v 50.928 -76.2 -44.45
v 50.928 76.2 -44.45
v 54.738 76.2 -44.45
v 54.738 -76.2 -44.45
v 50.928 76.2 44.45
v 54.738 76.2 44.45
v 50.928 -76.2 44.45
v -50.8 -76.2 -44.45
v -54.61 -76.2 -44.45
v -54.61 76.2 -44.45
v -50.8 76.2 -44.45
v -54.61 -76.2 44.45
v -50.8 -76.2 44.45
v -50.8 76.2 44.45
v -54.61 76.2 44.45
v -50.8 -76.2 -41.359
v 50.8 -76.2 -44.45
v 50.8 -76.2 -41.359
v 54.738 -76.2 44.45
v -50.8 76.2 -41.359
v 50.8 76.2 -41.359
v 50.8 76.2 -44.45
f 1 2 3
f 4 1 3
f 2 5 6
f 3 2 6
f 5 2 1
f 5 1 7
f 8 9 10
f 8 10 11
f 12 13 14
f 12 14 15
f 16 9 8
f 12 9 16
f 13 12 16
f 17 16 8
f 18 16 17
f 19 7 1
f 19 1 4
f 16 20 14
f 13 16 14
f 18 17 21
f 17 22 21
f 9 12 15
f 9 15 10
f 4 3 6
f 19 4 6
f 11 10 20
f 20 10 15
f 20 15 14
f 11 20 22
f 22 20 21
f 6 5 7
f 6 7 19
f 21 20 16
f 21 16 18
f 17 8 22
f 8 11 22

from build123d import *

# Parameters (mm, degrees)
F0_W     = 3.81
F0_H     = 88.9
F0_W_2   = 101.6
F0_H_2   = 3.091447
F1_DEPTH = 76.2


with BuildPart() as f1:
    # F0 (on Front) → F1 (new body, symmetric)
    with BuildSketch(Plane.XZ):
        Polygon((-50.8, 44.45), (-54.61, 44.45), (-54.61, -44.45), (-50.8, -44.45), (-50.8, -41.358553), align=None)
        with Locations((52.833073, 0)):
            Rectangle(F0_W, F0_H)
        with Locations((0, -42.904276)):
            Rectangle(F0_W_2, F0_H_2)
    extrude(amount=F1_DEPTH, both=True)


solid = f1.part
